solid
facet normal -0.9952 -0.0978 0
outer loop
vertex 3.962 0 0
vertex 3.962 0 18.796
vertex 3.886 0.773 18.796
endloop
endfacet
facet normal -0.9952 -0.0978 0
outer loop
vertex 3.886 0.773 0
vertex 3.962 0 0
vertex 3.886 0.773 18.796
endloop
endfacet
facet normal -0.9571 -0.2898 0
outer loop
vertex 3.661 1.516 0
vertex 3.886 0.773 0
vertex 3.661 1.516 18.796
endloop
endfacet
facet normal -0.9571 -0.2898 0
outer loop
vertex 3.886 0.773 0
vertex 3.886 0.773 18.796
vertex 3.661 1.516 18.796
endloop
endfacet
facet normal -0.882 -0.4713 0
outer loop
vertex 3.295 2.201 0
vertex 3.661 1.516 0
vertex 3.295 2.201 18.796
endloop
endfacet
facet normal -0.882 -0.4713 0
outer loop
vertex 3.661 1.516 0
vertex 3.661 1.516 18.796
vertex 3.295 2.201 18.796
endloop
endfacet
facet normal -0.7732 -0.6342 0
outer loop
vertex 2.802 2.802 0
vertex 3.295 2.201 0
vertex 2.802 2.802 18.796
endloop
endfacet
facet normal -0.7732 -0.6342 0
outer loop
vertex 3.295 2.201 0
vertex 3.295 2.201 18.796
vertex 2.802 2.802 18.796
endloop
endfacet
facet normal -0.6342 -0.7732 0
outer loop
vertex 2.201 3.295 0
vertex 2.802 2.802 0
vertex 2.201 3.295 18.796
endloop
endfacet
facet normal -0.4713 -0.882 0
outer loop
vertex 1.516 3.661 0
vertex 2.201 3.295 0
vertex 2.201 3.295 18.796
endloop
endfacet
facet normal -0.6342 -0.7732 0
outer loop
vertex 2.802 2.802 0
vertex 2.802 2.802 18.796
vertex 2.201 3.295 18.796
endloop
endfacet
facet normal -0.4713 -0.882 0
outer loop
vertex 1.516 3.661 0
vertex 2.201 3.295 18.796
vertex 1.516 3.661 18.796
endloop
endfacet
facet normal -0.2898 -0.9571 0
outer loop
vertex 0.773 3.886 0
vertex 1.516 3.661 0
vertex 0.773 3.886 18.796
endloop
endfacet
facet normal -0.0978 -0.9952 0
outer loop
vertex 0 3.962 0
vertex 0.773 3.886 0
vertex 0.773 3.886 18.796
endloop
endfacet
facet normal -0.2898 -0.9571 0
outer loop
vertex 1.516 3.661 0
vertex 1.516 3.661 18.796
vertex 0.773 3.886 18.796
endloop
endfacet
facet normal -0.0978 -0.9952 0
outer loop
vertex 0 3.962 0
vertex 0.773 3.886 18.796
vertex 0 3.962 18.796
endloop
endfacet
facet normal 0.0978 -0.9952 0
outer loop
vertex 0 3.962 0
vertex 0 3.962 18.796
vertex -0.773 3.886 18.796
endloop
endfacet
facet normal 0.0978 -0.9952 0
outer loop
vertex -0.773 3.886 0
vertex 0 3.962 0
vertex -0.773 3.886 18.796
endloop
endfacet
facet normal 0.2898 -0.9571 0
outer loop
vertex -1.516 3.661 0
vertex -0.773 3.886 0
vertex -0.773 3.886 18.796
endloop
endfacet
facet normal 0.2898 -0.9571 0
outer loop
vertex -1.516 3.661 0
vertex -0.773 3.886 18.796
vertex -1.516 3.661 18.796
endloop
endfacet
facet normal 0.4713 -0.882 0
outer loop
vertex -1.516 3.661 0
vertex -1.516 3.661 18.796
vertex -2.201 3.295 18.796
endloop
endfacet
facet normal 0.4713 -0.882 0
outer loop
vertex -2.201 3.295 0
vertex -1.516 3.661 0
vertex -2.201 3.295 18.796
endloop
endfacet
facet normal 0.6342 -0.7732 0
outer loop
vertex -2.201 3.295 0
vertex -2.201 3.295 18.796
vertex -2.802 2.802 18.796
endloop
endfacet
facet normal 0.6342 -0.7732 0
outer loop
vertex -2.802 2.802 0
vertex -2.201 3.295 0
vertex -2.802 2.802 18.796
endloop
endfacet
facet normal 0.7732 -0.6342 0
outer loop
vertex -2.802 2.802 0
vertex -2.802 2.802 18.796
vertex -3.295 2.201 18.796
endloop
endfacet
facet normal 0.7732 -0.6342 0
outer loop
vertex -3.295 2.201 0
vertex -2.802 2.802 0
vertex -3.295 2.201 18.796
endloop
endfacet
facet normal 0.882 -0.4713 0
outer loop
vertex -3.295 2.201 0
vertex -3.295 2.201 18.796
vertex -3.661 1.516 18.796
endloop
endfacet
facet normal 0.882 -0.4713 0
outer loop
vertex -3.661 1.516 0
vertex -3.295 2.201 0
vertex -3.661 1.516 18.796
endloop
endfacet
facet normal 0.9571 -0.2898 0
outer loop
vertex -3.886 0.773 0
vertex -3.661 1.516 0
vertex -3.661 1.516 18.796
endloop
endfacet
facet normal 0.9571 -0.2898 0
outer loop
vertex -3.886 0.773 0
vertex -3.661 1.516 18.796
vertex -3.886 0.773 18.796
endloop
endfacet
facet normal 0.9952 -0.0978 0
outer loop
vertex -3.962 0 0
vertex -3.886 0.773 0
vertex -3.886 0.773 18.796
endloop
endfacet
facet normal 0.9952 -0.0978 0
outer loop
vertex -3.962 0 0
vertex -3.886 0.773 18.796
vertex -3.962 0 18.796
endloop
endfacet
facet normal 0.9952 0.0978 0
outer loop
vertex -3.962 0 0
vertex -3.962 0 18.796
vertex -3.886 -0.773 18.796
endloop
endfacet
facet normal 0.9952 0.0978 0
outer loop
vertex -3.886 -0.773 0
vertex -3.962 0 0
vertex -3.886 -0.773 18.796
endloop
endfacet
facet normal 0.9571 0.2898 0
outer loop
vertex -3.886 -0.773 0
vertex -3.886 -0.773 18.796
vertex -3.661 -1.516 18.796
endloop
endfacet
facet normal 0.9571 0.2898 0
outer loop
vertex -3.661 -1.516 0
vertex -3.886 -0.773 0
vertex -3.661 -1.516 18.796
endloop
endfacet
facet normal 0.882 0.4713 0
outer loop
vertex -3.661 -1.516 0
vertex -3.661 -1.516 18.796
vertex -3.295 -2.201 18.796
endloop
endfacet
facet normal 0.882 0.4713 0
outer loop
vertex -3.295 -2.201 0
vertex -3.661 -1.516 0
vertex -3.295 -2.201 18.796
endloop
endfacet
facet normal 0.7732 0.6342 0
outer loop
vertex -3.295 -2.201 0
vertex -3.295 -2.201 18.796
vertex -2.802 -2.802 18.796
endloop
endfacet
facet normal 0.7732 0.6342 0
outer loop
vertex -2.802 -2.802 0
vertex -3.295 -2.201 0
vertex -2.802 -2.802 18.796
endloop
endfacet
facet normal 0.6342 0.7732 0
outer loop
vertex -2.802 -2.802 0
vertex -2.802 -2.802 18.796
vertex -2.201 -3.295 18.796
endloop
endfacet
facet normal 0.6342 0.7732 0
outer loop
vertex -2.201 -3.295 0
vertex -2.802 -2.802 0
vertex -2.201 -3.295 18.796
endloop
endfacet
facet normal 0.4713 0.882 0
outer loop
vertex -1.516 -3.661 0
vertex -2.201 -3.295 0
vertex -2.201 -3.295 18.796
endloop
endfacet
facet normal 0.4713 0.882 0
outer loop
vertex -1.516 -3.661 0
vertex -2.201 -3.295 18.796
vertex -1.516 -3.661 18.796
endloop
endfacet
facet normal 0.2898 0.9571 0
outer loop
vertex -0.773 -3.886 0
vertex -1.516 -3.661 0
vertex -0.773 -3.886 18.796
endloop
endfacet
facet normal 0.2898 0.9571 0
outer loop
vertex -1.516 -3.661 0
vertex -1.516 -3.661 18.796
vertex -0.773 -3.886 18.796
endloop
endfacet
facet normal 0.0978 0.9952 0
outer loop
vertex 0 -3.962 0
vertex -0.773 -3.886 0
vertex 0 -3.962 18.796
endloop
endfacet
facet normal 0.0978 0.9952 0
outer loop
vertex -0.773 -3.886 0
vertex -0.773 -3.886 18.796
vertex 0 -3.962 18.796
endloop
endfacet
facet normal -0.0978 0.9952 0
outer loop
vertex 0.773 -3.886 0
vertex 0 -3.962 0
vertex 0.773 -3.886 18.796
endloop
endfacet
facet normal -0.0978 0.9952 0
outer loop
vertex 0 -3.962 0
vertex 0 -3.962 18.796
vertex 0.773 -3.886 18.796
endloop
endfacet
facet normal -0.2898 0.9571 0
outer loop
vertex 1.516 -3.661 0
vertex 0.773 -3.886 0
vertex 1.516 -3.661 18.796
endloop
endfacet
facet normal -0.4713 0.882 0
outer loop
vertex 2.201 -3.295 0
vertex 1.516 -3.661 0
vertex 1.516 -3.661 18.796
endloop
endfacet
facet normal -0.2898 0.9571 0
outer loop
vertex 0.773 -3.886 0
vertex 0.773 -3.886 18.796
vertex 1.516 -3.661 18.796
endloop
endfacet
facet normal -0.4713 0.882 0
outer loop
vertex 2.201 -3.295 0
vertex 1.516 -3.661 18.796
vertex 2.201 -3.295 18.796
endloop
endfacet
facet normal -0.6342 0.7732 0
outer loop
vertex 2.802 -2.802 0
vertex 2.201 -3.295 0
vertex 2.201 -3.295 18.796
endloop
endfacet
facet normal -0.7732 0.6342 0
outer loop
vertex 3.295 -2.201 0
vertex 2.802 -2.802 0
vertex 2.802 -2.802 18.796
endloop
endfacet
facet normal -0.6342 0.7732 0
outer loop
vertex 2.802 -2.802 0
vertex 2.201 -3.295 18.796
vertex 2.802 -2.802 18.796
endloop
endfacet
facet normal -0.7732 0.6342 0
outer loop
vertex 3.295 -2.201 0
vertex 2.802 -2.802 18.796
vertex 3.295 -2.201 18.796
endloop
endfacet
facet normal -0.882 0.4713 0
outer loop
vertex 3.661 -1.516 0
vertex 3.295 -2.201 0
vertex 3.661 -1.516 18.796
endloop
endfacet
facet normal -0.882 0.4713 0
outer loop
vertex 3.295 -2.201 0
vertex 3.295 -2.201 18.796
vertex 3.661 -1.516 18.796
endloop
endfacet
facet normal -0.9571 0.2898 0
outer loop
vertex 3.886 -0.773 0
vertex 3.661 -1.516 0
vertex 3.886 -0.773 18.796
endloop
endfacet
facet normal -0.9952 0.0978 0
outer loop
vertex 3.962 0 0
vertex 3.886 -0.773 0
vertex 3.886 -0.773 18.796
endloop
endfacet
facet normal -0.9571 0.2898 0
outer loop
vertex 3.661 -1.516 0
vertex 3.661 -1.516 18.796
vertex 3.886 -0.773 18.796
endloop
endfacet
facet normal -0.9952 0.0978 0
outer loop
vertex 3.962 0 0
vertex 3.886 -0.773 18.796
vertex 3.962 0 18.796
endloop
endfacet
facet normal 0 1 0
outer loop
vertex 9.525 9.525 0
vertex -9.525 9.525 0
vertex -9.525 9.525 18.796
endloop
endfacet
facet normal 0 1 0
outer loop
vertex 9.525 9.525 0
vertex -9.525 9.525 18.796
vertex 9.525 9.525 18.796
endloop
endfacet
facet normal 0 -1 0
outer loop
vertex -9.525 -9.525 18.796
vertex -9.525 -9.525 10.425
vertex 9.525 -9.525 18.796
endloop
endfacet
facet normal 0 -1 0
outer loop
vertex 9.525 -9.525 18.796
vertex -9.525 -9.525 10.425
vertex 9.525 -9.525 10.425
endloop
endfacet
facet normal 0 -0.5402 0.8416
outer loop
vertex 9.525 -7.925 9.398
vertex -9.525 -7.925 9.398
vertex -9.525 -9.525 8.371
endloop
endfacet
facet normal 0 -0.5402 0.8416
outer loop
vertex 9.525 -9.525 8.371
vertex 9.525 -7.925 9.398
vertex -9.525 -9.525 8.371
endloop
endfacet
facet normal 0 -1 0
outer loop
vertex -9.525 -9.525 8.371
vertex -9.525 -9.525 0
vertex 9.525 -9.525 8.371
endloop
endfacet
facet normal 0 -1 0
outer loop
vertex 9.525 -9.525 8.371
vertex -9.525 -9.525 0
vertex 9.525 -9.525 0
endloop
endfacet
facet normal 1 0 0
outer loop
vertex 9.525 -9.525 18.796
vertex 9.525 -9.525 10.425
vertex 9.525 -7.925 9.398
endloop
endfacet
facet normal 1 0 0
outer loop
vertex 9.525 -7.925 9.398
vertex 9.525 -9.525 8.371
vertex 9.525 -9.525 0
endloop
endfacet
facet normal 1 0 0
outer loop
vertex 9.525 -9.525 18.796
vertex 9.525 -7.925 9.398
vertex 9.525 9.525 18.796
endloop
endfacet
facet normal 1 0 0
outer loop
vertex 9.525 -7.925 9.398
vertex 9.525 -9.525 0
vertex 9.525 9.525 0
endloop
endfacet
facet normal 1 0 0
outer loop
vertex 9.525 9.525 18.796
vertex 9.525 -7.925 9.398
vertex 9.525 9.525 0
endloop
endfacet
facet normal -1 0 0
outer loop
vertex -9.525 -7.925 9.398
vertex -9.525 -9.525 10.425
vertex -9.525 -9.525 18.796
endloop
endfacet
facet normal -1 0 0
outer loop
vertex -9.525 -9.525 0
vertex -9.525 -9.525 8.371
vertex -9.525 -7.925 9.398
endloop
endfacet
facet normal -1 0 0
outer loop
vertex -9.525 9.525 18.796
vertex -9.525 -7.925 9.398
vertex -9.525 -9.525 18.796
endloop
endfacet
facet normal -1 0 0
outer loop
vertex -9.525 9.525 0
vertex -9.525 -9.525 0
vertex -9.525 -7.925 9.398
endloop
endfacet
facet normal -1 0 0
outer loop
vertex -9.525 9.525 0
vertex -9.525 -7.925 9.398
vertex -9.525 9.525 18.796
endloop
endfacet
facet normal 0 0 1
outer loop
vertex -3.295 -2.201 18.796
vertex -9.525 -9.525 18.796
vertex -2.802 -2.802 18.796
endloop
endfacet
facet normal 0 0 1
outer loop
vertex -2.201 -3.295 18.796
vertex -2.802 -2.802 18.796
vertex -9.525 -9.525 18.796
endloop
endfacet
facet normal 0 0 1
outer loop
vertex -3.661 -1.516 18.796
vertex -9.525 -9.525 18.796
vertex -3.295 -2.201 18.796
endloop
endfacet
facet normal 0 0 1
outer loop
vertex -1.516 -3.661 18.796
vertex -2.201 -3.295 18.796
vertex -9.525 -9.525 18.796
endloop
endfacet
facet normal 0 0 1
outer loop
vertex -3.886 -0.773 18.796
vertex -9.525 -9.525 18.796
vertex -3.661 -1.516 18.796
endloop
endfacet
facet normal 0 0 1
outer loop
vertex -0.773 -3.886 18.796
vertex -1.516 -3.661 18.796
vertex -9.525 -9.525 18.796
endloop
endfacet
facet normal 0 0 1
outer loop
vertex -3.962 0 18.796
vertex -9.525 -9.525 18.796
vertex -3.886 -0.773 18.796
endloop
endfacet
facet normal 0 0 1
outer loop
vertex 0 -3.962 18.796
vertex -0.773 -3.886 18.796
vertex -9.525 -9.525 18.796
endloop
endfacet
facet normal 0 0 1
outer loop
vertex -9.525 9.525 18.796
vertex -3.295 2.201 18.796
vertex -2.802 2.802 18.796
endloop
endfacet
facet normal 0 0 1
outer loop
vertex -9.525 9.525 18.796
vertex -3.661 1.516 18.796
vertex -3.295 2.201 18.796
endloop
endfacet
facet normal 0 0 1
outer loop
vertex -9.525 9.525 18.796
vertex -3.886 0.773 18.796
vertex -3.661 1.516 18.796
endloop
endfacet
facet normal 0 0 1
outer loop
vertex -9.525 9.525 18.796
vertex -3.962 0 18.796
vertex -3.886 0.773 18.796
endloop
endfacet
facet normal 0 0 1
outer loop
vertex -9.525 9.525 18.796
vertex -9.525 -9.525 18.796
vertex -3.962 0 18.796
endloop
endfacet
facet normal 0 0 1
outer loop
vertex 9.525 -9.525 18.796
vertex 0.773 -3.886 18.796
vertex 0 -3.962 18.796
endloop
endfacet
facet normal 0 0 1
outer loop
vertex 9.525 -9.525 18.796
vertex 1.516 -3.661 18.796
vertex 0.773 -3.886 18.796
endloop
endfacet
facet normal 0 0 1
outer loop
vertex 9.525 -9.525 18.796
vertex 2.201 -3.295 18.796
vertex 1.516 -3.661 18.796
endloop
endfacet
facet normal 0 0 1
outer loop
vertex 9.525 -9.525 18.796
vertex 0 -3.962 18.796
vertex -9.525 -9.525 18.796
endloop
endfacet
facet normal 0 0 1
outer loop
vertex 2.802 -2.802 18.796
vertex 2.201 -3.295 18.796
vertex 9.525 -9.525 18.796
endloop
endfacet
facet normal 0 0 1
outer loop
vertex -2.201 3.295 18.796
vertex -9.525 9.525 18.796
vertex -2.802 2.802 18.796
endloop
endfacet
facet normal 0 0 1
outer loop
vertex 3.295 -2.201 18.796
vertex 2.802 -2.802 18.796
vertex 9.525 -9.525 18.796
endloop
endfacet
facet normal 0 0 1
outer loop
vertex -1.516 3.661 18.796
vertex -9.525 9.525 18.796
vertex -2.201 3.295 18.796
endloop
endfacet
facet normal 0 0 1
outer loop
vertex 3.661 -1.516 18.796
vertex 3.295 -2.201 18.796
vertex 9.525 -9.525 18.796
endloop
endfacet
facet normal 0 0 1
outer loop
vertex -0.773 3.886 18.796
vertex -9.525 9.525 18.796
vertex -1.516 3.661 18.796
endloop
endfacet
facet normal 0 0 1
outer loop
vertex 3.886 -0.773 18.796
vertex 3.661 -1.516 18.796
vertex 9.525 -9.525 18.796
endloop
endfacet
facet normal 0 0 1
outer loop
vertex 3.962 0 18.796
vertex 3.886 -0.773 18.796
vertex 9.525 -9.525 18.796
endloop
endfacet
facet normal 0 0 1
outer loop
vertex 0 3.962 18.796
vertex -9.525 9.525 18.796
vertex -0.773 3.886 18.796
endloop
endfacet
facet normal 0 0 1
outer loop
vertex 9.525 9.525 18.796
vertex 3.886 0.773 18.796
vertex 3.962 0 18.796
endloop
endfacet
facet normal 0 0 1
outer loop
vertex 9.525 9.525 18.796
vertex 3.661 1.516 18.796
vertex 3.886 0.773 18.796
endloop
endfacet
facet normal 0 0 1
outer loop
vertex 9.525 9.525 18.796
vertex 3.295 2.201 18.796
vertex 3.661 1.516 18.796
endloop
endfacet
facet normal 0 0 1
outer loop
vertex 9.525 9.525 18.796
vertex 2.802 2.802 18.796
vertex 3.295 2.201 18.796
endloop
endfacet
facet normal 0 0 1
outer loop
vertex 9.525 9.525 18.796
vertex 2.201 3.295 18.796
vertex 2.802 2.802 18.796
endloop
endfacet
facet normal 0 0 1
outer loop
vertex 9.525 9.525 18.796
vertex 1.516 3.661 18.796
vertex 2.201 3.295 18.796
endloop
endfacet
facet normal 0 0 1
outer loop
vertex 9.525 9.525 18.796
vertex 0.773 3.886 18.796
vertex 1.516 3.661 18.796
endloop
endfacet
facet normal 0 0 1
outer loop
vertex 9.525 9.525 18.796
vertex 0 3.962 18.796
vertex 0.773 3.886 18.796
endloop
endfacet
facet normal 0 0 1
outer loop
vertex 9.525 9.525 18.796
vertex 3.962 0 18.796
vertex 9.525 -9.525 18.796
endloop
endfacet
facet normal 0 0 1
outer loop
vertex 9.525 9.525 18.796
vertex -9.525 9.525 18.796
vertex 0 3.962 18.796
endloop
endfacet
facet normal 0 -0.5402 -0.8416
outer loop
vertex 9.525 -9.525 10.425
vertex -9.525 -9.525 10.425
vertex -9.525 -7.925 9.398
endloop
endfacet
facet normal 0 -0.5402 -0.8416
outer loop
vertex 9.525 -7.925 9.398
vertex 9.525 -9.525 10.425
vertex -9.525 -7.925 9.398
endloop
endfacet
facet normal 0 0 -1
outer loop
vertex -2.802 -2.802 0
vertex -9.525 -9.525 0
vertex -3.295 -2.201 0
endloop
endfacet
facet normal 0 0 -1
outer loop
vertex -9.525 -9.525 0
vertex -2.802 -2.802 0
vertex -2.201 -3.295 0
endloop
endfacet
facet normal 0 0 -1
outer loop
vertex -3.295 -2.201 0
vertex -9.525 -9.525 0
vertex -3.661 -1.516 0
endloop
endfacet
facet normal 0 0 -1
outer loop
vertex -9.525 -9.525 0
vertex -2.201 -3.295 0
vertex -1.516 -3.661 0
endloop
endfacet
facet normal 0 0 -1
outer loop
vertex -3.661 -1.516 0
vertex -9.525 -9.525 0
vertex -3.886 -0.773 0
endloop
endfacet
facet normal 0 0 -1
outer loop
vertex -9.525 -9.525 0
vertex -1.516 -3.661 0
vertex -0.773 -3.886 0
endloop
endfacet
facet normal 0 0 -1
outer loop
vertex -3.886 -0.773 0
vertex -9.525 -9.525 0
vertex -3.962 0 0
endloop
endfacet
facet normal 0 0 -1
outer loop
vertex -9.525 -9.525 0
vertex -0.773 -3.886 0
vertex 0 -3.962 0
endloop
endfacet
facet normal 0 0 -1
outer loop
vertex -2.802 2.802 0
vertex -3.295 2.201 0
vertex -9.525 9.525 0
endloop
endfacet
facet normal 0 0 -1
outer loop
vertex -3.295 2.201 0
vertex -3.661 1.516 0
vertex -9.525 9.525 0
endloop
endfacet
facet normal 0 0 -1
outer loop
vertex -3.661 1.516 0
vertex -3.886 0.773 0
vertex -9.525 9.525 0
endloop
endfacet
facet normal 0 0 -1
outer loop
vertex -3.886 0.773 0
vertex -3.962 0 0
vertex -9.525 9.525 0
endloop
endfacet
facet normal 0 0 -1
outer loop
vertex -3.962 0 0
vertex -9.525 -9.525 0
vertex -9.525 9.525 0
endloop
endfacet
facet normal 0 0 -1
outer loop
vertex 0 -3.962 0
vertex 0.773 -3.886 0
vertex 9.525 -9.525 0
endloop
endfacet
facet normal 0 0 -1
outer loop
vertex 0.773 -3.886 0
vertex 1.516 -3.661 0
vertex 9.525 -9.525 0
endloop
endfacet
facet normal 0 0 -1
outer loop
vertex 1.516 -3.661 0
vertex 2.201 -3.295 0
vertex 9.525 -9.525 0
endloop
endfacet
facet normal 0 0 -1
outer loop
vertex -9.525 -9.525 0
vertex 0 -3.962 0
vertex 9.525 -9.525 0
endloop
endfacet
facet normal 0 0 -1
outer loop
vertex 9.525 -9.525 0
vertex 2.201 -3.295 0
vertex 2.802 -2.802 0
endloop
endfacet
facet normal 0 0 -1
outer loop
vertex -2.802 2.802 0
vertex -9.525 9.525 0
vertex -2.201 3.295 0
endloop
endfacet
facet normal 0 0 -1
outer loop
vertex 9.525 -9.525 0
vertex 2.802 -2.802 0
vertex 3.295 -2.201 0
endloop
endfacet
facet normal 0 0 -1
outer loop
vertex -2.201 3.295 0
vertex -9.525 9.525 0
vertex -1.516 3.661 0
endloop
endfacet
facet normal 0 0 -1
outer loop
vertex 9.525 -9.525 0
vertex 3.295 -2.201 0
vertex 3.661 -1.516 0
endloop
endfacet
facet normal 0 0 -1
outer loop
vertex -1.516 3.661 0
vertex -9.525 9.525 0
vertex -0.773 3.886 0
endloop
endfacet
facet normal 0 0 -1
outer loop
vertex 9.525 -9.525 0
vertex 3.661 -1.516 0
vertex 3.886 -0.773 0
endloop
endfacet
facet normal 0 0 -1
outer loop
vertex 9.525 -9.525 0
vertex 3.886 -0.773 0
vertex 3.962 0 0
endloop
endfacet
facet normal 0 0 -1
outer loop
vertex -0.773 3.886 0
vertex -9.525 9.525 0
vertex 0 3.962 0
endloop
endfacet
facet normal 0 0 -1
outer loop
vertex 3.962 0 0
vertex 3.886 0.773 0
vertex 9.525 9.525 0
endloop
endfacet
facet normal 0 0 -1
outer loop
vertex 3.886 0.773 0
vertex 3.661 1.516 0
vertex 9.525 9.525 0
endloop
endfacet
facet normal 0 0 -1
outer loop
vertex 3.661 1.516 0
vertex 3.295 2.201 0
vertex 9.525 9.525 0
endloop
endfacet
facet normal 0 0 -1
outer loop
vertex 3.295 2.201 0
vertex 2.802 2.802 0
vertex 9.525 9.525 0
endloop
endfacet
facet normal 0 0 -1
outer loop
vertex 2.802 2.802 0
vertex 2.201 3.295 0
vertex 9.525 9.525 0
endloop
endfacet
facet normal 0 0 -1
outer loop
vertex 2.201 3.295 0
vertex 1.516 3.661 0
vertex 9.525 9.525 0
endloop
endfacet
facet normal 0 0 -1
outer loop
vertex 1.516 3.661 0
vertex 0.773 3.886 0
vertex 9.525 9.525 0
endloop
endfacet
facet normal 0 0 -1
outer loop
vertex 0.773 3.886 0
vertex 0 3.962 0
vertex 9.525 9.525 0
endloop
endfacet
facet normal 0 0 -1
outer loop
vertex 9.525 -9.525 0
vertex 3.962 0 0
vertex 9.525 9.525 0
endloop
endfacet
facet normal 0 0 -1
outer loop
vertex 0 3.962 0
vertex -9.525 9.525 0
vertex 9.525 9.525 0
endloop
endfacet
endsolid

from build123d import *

# Parameters (mm, degrees)
SKETCH1_W               = 19.05
SKETCH1_H               = 19.05
BOSS_EXTRUDE1_DEPTH     = 18.796
SKETCH2_R               = 3.9624
CUT_EXTRUDE1_DEPTH      = 24.124464664
CUT_EXTRUDE2_DEPTH      = 24.124464664
CUT_EXTRUDE2_DEPTH_BACK = 24.124464664


with BuildPart() as part:
    # Sketch1 → Boss-Extrude1 (new body)
    with BuildSketch(Plane.XY):
        Rectangle(SKETCH1_W, SKETCH1_H)
    extrude(amount=BOSS_EXTRUDE1_DEPTH)

    # Sketch2 → Cut-Extrude1 (cut, through all)
    with BuildSketch(Plane.XY.offset(18.796)):
        Circle(SKETCH2_R)
    extrude(amount=-CUT_EXTRUDE1_DEPTH, mode=Mode.SUBTRACT)

    # Sketch3 → Cut-Extrude2 (cut, two sides: drawn at the far end of the back side and taken through both)
    with BuildSketch(Plane(origin=(0, 0, 0), x_dir=(0, 0, -1), z_dir=(1, 0, 0)).offset(-CUT_EXTRUDE2_DEPTH_BACK)):
        Polygon((-39.274452126, -54.498347151), (-10.424511864, -9.525), (-9.398, -7.9248), (-8.371488136, -9.525), (20.478452126, -54.498347151), (20.478452126, -161.361268824), (-39.274452126, -161.361268824), align=None)
    extrude(amount=CUT_EXTRUDE2_DEPTH + CUT_EXTRUDE2_DEPTH_BACK, mode=Mode.SUBTRACT)


solid = part.part
